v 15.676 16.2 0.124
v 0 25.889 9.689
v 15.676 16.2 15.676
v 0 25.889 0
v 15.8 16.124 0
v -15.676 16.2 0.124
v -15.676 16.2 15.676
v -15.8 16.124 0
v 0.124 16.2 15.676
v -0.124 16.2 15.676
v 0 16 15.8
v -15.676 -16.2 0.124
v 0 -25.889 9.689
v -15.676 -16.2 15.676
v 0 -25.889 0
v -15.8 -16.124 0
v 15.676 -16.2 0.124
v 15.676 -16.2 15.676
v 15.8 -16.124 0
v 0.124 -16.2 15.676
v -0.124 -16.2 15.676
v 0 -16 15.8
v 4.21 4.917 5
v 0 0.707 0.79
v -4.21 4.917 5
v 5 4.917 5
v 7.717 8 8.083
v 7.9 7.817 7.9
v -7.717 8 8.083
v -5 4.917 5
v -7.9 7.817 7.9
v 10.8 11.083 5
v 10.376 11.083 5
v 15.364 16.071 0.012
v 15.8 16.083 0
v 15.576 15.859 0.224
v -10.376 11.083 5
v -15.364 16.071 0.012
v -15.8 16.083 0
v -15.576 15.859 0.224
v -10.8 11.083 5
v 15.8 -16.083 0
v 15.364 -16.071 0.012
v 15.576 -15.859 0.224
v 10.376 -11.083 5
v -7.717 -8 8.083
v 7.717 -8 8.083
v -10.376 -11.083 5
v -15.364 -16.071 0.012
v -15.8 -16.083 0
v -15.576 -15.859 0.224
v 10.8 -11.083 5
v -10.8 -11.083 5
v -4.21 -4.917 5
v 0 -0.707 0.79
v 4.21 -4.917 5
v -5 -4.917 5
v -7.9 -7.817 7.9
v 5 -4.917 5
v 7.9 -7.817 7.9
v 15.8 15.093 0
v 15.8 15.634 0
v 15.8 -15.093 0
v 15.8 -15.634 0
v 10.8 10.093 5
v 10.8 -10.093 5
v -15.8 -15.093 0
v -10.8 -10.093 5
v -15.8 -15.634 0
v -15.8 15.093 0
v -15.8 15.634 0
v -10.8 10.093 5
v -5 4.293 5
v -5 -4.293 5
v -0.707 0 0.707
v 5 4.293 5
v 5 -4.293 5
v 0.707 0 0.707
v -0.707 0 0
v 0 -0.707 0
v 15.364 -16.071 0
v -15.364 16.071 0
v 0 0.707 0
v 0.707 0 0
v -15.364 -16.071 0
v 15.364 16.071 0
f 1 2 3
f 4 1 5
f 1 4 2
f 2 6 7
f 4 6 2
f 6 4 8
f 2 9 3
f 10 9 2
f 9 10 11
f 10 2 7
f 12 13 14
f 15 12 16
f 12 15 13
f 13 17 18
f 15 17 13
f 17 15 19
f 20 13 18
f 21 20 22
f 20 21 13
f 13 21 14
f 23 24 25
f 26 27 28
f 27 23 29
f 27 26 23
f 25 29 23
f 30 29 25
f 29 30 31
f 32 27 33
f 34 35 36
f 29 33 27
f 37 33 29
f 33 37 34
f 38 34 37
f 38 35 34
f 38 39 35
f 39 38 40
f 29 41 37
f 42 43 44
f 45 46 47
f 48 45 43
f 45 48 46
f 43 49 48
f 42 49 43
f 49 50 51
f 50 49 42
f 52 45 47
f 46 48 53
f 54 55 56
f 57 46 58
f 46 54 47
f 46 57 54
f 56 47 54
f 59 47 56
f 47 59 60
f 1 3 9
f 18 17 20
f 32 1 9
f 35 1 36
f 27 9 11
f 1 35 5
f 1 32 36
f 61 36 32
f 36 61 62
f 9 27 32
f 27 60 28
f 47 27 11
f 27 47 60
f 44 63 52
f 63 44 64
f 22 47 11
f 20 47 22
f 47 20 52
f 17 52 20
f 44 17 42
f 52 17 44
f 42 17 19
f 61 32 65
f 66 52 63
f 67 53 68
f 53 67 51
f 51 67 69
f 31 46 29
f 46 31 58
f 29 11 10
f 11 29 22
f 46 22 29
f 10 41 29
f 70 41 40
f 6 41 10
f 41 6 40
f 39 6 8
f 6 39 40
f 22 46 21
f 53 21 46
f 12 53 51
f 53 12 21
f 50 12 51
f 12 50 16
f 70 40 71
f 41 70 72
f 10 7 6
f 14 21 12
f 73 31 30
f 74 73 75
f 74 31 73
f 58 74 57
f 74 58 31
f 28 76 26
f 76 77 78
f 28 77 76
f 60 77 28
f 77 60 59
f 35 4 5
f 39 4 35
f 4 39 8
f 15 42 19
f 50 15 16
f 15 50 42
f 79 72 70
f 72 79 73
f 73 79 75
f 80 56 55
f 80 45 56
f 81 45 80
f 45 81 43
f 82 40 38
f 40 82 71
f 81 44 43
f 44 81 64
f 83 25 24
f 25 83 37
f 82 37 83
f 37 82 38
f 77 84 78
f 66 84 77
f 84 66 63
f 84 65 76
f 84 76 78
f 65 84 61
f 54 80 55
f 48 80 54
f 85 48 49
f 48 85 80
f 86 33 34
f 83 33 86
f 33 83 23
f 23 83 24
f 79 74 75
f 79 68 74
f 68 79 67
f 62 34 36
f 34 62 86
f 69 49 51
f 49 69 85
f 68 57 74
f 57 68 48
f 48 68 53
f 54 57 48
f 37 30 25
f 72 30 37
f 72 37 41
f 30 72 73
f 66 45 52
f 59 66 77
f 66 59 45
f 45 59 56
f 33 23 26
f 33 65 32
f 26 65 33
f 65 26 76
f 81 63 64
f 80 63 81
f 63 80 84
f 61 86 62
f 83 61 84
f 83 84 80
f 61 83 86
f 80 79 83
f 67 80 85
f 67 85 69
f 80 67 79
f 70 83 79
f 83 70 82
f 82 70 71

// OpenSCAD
// file: ../BasicShapes/Dodecahedron.scad
rpenta = 1/sin(72);

// rpenta * 1/2*sqrt(2)*sqrt(-sqrt(5) + 5)
cpenta = rpenta * sqrt(pow(sin(72), 2) + pow(1-cos(72), 2));

// z^2 + (1-cpenta/2)^2 + 1 = cpenta^2
// zc = sqrt(pow(cpenta, 2) - (pow(1-cpenta/2, 2) + 1));
zc = cpenta/2;

module dodecaprism() {
     polyhedron ( points = [
		       [ 1, 1, 0],
		       [ 1,-1, 0],
		       [-1, 1, 0],
		       [-1,-1, 0],
		       [ cpenta/2,0,zc],
		       [-cpenta/2,0,zc]
		       ],
                 faces = [[0,2,1],
                          [1,2,3],
                          [0,1,4],
			  [0,4,2],
			  [2,4,5],
			  [1,3,4],
			  [3,5,4],
			  [2,5,3]
		      ]
             );

};

module dodecahedron(scl) {
  scale(scl) {
    cube(2, center=true);
    translate([0,0,1]) dodecaprism();
    translate([0,0,-1]) rotate([180,0,0]) dodecaprism();
    rotate([-90,90,0]) translate([0,0,1]) dodecaprism();
    rotate([-90,90,180]) translate([0,0,1]) dodecaprism();
    rotate([90,0,0]) rotate([0,90,0]) translate([0,0,1]) dodecaprism();
    rotate([90,0,180]) rotate([0,90,0]) translate([0,0,1]) dodecaprism();
  }
};

dodecahedron();
// main file
use <../BasicShapes/Dodecahedron.scad>;

cote=40*0.8;
c2=2*cote;
eps=0.4;
d=cote*sqrt(2)/4;
de=d+eps;

supwidth = 1;

module piece() {
  intersection() {
    difference() {
	dodecahedron(cote/2);

	translate([0,  cote/4, 0]) rotate([45, 0, 0]) cube([c2, de, de], center=true);
	translate([0, -cote/4, 0]) rotate([45, 0, 0]) cube([c2, de, de], center=true);

	translate([ d,0,d+cote/2]) rotate([0, 45,0]) cube([c2, cote+eps, cote], center=true);
	translate([-d,0,d+cote/2]) rotate([0,-45,0]) cube([c2, cote+eps, cote], center=true);

	translate([-d,0,-d+eps/2]) rotate([0, 45,0]) cube([c2, cote/2, cote], center=true);
	translate([ d,0,-d+eps/2]) rotate([0,-45,0]) cube([c2, cote/2, cote], center=true);
    }
  translate([-cote/2, -cote, eps/2]) cube([cote,c2,c2]);
  }
}

bla=d-2*eps;


// This is the support
module support () {
intersection() {
  difference() {
    translate([0,0,d/4-eps]) {
      union() {
        rotate([0,0, 45]) cube ([supwidth,4*d-2*eps,d], center=true);
	rotate([0,0,-45]) cube ([supwidth,4*d-2*eps,d], center=true);
       }
    }
    translate([ d,0,d+cote/2]) rotate([0, 45,0]) cube([c2, cote+eps, cote], center=true);
    translate([-d,0,d+cote/2]) rotate([0,-45,0]) cube([c2, cote+eps, cote], center=true);
  }
  translate([-cote/2, -cote, eps/2]) cube([cote,c2,5]);
}
}


translate([0,0,-eps/2]) {
     union() {
	  piece();
	  support();
     }
}


//piece();
//rotate([0, 180, 0]) piece();
//rotate([90, 90, 0]) piece();
//rotate([-90, 90, 0]) piece();
//rotate([0, 90, 0]) rotate([0, 0, 90]) piece();
//rotate([0, -90, 0]) rotate([0, 0, 90]) piece();
